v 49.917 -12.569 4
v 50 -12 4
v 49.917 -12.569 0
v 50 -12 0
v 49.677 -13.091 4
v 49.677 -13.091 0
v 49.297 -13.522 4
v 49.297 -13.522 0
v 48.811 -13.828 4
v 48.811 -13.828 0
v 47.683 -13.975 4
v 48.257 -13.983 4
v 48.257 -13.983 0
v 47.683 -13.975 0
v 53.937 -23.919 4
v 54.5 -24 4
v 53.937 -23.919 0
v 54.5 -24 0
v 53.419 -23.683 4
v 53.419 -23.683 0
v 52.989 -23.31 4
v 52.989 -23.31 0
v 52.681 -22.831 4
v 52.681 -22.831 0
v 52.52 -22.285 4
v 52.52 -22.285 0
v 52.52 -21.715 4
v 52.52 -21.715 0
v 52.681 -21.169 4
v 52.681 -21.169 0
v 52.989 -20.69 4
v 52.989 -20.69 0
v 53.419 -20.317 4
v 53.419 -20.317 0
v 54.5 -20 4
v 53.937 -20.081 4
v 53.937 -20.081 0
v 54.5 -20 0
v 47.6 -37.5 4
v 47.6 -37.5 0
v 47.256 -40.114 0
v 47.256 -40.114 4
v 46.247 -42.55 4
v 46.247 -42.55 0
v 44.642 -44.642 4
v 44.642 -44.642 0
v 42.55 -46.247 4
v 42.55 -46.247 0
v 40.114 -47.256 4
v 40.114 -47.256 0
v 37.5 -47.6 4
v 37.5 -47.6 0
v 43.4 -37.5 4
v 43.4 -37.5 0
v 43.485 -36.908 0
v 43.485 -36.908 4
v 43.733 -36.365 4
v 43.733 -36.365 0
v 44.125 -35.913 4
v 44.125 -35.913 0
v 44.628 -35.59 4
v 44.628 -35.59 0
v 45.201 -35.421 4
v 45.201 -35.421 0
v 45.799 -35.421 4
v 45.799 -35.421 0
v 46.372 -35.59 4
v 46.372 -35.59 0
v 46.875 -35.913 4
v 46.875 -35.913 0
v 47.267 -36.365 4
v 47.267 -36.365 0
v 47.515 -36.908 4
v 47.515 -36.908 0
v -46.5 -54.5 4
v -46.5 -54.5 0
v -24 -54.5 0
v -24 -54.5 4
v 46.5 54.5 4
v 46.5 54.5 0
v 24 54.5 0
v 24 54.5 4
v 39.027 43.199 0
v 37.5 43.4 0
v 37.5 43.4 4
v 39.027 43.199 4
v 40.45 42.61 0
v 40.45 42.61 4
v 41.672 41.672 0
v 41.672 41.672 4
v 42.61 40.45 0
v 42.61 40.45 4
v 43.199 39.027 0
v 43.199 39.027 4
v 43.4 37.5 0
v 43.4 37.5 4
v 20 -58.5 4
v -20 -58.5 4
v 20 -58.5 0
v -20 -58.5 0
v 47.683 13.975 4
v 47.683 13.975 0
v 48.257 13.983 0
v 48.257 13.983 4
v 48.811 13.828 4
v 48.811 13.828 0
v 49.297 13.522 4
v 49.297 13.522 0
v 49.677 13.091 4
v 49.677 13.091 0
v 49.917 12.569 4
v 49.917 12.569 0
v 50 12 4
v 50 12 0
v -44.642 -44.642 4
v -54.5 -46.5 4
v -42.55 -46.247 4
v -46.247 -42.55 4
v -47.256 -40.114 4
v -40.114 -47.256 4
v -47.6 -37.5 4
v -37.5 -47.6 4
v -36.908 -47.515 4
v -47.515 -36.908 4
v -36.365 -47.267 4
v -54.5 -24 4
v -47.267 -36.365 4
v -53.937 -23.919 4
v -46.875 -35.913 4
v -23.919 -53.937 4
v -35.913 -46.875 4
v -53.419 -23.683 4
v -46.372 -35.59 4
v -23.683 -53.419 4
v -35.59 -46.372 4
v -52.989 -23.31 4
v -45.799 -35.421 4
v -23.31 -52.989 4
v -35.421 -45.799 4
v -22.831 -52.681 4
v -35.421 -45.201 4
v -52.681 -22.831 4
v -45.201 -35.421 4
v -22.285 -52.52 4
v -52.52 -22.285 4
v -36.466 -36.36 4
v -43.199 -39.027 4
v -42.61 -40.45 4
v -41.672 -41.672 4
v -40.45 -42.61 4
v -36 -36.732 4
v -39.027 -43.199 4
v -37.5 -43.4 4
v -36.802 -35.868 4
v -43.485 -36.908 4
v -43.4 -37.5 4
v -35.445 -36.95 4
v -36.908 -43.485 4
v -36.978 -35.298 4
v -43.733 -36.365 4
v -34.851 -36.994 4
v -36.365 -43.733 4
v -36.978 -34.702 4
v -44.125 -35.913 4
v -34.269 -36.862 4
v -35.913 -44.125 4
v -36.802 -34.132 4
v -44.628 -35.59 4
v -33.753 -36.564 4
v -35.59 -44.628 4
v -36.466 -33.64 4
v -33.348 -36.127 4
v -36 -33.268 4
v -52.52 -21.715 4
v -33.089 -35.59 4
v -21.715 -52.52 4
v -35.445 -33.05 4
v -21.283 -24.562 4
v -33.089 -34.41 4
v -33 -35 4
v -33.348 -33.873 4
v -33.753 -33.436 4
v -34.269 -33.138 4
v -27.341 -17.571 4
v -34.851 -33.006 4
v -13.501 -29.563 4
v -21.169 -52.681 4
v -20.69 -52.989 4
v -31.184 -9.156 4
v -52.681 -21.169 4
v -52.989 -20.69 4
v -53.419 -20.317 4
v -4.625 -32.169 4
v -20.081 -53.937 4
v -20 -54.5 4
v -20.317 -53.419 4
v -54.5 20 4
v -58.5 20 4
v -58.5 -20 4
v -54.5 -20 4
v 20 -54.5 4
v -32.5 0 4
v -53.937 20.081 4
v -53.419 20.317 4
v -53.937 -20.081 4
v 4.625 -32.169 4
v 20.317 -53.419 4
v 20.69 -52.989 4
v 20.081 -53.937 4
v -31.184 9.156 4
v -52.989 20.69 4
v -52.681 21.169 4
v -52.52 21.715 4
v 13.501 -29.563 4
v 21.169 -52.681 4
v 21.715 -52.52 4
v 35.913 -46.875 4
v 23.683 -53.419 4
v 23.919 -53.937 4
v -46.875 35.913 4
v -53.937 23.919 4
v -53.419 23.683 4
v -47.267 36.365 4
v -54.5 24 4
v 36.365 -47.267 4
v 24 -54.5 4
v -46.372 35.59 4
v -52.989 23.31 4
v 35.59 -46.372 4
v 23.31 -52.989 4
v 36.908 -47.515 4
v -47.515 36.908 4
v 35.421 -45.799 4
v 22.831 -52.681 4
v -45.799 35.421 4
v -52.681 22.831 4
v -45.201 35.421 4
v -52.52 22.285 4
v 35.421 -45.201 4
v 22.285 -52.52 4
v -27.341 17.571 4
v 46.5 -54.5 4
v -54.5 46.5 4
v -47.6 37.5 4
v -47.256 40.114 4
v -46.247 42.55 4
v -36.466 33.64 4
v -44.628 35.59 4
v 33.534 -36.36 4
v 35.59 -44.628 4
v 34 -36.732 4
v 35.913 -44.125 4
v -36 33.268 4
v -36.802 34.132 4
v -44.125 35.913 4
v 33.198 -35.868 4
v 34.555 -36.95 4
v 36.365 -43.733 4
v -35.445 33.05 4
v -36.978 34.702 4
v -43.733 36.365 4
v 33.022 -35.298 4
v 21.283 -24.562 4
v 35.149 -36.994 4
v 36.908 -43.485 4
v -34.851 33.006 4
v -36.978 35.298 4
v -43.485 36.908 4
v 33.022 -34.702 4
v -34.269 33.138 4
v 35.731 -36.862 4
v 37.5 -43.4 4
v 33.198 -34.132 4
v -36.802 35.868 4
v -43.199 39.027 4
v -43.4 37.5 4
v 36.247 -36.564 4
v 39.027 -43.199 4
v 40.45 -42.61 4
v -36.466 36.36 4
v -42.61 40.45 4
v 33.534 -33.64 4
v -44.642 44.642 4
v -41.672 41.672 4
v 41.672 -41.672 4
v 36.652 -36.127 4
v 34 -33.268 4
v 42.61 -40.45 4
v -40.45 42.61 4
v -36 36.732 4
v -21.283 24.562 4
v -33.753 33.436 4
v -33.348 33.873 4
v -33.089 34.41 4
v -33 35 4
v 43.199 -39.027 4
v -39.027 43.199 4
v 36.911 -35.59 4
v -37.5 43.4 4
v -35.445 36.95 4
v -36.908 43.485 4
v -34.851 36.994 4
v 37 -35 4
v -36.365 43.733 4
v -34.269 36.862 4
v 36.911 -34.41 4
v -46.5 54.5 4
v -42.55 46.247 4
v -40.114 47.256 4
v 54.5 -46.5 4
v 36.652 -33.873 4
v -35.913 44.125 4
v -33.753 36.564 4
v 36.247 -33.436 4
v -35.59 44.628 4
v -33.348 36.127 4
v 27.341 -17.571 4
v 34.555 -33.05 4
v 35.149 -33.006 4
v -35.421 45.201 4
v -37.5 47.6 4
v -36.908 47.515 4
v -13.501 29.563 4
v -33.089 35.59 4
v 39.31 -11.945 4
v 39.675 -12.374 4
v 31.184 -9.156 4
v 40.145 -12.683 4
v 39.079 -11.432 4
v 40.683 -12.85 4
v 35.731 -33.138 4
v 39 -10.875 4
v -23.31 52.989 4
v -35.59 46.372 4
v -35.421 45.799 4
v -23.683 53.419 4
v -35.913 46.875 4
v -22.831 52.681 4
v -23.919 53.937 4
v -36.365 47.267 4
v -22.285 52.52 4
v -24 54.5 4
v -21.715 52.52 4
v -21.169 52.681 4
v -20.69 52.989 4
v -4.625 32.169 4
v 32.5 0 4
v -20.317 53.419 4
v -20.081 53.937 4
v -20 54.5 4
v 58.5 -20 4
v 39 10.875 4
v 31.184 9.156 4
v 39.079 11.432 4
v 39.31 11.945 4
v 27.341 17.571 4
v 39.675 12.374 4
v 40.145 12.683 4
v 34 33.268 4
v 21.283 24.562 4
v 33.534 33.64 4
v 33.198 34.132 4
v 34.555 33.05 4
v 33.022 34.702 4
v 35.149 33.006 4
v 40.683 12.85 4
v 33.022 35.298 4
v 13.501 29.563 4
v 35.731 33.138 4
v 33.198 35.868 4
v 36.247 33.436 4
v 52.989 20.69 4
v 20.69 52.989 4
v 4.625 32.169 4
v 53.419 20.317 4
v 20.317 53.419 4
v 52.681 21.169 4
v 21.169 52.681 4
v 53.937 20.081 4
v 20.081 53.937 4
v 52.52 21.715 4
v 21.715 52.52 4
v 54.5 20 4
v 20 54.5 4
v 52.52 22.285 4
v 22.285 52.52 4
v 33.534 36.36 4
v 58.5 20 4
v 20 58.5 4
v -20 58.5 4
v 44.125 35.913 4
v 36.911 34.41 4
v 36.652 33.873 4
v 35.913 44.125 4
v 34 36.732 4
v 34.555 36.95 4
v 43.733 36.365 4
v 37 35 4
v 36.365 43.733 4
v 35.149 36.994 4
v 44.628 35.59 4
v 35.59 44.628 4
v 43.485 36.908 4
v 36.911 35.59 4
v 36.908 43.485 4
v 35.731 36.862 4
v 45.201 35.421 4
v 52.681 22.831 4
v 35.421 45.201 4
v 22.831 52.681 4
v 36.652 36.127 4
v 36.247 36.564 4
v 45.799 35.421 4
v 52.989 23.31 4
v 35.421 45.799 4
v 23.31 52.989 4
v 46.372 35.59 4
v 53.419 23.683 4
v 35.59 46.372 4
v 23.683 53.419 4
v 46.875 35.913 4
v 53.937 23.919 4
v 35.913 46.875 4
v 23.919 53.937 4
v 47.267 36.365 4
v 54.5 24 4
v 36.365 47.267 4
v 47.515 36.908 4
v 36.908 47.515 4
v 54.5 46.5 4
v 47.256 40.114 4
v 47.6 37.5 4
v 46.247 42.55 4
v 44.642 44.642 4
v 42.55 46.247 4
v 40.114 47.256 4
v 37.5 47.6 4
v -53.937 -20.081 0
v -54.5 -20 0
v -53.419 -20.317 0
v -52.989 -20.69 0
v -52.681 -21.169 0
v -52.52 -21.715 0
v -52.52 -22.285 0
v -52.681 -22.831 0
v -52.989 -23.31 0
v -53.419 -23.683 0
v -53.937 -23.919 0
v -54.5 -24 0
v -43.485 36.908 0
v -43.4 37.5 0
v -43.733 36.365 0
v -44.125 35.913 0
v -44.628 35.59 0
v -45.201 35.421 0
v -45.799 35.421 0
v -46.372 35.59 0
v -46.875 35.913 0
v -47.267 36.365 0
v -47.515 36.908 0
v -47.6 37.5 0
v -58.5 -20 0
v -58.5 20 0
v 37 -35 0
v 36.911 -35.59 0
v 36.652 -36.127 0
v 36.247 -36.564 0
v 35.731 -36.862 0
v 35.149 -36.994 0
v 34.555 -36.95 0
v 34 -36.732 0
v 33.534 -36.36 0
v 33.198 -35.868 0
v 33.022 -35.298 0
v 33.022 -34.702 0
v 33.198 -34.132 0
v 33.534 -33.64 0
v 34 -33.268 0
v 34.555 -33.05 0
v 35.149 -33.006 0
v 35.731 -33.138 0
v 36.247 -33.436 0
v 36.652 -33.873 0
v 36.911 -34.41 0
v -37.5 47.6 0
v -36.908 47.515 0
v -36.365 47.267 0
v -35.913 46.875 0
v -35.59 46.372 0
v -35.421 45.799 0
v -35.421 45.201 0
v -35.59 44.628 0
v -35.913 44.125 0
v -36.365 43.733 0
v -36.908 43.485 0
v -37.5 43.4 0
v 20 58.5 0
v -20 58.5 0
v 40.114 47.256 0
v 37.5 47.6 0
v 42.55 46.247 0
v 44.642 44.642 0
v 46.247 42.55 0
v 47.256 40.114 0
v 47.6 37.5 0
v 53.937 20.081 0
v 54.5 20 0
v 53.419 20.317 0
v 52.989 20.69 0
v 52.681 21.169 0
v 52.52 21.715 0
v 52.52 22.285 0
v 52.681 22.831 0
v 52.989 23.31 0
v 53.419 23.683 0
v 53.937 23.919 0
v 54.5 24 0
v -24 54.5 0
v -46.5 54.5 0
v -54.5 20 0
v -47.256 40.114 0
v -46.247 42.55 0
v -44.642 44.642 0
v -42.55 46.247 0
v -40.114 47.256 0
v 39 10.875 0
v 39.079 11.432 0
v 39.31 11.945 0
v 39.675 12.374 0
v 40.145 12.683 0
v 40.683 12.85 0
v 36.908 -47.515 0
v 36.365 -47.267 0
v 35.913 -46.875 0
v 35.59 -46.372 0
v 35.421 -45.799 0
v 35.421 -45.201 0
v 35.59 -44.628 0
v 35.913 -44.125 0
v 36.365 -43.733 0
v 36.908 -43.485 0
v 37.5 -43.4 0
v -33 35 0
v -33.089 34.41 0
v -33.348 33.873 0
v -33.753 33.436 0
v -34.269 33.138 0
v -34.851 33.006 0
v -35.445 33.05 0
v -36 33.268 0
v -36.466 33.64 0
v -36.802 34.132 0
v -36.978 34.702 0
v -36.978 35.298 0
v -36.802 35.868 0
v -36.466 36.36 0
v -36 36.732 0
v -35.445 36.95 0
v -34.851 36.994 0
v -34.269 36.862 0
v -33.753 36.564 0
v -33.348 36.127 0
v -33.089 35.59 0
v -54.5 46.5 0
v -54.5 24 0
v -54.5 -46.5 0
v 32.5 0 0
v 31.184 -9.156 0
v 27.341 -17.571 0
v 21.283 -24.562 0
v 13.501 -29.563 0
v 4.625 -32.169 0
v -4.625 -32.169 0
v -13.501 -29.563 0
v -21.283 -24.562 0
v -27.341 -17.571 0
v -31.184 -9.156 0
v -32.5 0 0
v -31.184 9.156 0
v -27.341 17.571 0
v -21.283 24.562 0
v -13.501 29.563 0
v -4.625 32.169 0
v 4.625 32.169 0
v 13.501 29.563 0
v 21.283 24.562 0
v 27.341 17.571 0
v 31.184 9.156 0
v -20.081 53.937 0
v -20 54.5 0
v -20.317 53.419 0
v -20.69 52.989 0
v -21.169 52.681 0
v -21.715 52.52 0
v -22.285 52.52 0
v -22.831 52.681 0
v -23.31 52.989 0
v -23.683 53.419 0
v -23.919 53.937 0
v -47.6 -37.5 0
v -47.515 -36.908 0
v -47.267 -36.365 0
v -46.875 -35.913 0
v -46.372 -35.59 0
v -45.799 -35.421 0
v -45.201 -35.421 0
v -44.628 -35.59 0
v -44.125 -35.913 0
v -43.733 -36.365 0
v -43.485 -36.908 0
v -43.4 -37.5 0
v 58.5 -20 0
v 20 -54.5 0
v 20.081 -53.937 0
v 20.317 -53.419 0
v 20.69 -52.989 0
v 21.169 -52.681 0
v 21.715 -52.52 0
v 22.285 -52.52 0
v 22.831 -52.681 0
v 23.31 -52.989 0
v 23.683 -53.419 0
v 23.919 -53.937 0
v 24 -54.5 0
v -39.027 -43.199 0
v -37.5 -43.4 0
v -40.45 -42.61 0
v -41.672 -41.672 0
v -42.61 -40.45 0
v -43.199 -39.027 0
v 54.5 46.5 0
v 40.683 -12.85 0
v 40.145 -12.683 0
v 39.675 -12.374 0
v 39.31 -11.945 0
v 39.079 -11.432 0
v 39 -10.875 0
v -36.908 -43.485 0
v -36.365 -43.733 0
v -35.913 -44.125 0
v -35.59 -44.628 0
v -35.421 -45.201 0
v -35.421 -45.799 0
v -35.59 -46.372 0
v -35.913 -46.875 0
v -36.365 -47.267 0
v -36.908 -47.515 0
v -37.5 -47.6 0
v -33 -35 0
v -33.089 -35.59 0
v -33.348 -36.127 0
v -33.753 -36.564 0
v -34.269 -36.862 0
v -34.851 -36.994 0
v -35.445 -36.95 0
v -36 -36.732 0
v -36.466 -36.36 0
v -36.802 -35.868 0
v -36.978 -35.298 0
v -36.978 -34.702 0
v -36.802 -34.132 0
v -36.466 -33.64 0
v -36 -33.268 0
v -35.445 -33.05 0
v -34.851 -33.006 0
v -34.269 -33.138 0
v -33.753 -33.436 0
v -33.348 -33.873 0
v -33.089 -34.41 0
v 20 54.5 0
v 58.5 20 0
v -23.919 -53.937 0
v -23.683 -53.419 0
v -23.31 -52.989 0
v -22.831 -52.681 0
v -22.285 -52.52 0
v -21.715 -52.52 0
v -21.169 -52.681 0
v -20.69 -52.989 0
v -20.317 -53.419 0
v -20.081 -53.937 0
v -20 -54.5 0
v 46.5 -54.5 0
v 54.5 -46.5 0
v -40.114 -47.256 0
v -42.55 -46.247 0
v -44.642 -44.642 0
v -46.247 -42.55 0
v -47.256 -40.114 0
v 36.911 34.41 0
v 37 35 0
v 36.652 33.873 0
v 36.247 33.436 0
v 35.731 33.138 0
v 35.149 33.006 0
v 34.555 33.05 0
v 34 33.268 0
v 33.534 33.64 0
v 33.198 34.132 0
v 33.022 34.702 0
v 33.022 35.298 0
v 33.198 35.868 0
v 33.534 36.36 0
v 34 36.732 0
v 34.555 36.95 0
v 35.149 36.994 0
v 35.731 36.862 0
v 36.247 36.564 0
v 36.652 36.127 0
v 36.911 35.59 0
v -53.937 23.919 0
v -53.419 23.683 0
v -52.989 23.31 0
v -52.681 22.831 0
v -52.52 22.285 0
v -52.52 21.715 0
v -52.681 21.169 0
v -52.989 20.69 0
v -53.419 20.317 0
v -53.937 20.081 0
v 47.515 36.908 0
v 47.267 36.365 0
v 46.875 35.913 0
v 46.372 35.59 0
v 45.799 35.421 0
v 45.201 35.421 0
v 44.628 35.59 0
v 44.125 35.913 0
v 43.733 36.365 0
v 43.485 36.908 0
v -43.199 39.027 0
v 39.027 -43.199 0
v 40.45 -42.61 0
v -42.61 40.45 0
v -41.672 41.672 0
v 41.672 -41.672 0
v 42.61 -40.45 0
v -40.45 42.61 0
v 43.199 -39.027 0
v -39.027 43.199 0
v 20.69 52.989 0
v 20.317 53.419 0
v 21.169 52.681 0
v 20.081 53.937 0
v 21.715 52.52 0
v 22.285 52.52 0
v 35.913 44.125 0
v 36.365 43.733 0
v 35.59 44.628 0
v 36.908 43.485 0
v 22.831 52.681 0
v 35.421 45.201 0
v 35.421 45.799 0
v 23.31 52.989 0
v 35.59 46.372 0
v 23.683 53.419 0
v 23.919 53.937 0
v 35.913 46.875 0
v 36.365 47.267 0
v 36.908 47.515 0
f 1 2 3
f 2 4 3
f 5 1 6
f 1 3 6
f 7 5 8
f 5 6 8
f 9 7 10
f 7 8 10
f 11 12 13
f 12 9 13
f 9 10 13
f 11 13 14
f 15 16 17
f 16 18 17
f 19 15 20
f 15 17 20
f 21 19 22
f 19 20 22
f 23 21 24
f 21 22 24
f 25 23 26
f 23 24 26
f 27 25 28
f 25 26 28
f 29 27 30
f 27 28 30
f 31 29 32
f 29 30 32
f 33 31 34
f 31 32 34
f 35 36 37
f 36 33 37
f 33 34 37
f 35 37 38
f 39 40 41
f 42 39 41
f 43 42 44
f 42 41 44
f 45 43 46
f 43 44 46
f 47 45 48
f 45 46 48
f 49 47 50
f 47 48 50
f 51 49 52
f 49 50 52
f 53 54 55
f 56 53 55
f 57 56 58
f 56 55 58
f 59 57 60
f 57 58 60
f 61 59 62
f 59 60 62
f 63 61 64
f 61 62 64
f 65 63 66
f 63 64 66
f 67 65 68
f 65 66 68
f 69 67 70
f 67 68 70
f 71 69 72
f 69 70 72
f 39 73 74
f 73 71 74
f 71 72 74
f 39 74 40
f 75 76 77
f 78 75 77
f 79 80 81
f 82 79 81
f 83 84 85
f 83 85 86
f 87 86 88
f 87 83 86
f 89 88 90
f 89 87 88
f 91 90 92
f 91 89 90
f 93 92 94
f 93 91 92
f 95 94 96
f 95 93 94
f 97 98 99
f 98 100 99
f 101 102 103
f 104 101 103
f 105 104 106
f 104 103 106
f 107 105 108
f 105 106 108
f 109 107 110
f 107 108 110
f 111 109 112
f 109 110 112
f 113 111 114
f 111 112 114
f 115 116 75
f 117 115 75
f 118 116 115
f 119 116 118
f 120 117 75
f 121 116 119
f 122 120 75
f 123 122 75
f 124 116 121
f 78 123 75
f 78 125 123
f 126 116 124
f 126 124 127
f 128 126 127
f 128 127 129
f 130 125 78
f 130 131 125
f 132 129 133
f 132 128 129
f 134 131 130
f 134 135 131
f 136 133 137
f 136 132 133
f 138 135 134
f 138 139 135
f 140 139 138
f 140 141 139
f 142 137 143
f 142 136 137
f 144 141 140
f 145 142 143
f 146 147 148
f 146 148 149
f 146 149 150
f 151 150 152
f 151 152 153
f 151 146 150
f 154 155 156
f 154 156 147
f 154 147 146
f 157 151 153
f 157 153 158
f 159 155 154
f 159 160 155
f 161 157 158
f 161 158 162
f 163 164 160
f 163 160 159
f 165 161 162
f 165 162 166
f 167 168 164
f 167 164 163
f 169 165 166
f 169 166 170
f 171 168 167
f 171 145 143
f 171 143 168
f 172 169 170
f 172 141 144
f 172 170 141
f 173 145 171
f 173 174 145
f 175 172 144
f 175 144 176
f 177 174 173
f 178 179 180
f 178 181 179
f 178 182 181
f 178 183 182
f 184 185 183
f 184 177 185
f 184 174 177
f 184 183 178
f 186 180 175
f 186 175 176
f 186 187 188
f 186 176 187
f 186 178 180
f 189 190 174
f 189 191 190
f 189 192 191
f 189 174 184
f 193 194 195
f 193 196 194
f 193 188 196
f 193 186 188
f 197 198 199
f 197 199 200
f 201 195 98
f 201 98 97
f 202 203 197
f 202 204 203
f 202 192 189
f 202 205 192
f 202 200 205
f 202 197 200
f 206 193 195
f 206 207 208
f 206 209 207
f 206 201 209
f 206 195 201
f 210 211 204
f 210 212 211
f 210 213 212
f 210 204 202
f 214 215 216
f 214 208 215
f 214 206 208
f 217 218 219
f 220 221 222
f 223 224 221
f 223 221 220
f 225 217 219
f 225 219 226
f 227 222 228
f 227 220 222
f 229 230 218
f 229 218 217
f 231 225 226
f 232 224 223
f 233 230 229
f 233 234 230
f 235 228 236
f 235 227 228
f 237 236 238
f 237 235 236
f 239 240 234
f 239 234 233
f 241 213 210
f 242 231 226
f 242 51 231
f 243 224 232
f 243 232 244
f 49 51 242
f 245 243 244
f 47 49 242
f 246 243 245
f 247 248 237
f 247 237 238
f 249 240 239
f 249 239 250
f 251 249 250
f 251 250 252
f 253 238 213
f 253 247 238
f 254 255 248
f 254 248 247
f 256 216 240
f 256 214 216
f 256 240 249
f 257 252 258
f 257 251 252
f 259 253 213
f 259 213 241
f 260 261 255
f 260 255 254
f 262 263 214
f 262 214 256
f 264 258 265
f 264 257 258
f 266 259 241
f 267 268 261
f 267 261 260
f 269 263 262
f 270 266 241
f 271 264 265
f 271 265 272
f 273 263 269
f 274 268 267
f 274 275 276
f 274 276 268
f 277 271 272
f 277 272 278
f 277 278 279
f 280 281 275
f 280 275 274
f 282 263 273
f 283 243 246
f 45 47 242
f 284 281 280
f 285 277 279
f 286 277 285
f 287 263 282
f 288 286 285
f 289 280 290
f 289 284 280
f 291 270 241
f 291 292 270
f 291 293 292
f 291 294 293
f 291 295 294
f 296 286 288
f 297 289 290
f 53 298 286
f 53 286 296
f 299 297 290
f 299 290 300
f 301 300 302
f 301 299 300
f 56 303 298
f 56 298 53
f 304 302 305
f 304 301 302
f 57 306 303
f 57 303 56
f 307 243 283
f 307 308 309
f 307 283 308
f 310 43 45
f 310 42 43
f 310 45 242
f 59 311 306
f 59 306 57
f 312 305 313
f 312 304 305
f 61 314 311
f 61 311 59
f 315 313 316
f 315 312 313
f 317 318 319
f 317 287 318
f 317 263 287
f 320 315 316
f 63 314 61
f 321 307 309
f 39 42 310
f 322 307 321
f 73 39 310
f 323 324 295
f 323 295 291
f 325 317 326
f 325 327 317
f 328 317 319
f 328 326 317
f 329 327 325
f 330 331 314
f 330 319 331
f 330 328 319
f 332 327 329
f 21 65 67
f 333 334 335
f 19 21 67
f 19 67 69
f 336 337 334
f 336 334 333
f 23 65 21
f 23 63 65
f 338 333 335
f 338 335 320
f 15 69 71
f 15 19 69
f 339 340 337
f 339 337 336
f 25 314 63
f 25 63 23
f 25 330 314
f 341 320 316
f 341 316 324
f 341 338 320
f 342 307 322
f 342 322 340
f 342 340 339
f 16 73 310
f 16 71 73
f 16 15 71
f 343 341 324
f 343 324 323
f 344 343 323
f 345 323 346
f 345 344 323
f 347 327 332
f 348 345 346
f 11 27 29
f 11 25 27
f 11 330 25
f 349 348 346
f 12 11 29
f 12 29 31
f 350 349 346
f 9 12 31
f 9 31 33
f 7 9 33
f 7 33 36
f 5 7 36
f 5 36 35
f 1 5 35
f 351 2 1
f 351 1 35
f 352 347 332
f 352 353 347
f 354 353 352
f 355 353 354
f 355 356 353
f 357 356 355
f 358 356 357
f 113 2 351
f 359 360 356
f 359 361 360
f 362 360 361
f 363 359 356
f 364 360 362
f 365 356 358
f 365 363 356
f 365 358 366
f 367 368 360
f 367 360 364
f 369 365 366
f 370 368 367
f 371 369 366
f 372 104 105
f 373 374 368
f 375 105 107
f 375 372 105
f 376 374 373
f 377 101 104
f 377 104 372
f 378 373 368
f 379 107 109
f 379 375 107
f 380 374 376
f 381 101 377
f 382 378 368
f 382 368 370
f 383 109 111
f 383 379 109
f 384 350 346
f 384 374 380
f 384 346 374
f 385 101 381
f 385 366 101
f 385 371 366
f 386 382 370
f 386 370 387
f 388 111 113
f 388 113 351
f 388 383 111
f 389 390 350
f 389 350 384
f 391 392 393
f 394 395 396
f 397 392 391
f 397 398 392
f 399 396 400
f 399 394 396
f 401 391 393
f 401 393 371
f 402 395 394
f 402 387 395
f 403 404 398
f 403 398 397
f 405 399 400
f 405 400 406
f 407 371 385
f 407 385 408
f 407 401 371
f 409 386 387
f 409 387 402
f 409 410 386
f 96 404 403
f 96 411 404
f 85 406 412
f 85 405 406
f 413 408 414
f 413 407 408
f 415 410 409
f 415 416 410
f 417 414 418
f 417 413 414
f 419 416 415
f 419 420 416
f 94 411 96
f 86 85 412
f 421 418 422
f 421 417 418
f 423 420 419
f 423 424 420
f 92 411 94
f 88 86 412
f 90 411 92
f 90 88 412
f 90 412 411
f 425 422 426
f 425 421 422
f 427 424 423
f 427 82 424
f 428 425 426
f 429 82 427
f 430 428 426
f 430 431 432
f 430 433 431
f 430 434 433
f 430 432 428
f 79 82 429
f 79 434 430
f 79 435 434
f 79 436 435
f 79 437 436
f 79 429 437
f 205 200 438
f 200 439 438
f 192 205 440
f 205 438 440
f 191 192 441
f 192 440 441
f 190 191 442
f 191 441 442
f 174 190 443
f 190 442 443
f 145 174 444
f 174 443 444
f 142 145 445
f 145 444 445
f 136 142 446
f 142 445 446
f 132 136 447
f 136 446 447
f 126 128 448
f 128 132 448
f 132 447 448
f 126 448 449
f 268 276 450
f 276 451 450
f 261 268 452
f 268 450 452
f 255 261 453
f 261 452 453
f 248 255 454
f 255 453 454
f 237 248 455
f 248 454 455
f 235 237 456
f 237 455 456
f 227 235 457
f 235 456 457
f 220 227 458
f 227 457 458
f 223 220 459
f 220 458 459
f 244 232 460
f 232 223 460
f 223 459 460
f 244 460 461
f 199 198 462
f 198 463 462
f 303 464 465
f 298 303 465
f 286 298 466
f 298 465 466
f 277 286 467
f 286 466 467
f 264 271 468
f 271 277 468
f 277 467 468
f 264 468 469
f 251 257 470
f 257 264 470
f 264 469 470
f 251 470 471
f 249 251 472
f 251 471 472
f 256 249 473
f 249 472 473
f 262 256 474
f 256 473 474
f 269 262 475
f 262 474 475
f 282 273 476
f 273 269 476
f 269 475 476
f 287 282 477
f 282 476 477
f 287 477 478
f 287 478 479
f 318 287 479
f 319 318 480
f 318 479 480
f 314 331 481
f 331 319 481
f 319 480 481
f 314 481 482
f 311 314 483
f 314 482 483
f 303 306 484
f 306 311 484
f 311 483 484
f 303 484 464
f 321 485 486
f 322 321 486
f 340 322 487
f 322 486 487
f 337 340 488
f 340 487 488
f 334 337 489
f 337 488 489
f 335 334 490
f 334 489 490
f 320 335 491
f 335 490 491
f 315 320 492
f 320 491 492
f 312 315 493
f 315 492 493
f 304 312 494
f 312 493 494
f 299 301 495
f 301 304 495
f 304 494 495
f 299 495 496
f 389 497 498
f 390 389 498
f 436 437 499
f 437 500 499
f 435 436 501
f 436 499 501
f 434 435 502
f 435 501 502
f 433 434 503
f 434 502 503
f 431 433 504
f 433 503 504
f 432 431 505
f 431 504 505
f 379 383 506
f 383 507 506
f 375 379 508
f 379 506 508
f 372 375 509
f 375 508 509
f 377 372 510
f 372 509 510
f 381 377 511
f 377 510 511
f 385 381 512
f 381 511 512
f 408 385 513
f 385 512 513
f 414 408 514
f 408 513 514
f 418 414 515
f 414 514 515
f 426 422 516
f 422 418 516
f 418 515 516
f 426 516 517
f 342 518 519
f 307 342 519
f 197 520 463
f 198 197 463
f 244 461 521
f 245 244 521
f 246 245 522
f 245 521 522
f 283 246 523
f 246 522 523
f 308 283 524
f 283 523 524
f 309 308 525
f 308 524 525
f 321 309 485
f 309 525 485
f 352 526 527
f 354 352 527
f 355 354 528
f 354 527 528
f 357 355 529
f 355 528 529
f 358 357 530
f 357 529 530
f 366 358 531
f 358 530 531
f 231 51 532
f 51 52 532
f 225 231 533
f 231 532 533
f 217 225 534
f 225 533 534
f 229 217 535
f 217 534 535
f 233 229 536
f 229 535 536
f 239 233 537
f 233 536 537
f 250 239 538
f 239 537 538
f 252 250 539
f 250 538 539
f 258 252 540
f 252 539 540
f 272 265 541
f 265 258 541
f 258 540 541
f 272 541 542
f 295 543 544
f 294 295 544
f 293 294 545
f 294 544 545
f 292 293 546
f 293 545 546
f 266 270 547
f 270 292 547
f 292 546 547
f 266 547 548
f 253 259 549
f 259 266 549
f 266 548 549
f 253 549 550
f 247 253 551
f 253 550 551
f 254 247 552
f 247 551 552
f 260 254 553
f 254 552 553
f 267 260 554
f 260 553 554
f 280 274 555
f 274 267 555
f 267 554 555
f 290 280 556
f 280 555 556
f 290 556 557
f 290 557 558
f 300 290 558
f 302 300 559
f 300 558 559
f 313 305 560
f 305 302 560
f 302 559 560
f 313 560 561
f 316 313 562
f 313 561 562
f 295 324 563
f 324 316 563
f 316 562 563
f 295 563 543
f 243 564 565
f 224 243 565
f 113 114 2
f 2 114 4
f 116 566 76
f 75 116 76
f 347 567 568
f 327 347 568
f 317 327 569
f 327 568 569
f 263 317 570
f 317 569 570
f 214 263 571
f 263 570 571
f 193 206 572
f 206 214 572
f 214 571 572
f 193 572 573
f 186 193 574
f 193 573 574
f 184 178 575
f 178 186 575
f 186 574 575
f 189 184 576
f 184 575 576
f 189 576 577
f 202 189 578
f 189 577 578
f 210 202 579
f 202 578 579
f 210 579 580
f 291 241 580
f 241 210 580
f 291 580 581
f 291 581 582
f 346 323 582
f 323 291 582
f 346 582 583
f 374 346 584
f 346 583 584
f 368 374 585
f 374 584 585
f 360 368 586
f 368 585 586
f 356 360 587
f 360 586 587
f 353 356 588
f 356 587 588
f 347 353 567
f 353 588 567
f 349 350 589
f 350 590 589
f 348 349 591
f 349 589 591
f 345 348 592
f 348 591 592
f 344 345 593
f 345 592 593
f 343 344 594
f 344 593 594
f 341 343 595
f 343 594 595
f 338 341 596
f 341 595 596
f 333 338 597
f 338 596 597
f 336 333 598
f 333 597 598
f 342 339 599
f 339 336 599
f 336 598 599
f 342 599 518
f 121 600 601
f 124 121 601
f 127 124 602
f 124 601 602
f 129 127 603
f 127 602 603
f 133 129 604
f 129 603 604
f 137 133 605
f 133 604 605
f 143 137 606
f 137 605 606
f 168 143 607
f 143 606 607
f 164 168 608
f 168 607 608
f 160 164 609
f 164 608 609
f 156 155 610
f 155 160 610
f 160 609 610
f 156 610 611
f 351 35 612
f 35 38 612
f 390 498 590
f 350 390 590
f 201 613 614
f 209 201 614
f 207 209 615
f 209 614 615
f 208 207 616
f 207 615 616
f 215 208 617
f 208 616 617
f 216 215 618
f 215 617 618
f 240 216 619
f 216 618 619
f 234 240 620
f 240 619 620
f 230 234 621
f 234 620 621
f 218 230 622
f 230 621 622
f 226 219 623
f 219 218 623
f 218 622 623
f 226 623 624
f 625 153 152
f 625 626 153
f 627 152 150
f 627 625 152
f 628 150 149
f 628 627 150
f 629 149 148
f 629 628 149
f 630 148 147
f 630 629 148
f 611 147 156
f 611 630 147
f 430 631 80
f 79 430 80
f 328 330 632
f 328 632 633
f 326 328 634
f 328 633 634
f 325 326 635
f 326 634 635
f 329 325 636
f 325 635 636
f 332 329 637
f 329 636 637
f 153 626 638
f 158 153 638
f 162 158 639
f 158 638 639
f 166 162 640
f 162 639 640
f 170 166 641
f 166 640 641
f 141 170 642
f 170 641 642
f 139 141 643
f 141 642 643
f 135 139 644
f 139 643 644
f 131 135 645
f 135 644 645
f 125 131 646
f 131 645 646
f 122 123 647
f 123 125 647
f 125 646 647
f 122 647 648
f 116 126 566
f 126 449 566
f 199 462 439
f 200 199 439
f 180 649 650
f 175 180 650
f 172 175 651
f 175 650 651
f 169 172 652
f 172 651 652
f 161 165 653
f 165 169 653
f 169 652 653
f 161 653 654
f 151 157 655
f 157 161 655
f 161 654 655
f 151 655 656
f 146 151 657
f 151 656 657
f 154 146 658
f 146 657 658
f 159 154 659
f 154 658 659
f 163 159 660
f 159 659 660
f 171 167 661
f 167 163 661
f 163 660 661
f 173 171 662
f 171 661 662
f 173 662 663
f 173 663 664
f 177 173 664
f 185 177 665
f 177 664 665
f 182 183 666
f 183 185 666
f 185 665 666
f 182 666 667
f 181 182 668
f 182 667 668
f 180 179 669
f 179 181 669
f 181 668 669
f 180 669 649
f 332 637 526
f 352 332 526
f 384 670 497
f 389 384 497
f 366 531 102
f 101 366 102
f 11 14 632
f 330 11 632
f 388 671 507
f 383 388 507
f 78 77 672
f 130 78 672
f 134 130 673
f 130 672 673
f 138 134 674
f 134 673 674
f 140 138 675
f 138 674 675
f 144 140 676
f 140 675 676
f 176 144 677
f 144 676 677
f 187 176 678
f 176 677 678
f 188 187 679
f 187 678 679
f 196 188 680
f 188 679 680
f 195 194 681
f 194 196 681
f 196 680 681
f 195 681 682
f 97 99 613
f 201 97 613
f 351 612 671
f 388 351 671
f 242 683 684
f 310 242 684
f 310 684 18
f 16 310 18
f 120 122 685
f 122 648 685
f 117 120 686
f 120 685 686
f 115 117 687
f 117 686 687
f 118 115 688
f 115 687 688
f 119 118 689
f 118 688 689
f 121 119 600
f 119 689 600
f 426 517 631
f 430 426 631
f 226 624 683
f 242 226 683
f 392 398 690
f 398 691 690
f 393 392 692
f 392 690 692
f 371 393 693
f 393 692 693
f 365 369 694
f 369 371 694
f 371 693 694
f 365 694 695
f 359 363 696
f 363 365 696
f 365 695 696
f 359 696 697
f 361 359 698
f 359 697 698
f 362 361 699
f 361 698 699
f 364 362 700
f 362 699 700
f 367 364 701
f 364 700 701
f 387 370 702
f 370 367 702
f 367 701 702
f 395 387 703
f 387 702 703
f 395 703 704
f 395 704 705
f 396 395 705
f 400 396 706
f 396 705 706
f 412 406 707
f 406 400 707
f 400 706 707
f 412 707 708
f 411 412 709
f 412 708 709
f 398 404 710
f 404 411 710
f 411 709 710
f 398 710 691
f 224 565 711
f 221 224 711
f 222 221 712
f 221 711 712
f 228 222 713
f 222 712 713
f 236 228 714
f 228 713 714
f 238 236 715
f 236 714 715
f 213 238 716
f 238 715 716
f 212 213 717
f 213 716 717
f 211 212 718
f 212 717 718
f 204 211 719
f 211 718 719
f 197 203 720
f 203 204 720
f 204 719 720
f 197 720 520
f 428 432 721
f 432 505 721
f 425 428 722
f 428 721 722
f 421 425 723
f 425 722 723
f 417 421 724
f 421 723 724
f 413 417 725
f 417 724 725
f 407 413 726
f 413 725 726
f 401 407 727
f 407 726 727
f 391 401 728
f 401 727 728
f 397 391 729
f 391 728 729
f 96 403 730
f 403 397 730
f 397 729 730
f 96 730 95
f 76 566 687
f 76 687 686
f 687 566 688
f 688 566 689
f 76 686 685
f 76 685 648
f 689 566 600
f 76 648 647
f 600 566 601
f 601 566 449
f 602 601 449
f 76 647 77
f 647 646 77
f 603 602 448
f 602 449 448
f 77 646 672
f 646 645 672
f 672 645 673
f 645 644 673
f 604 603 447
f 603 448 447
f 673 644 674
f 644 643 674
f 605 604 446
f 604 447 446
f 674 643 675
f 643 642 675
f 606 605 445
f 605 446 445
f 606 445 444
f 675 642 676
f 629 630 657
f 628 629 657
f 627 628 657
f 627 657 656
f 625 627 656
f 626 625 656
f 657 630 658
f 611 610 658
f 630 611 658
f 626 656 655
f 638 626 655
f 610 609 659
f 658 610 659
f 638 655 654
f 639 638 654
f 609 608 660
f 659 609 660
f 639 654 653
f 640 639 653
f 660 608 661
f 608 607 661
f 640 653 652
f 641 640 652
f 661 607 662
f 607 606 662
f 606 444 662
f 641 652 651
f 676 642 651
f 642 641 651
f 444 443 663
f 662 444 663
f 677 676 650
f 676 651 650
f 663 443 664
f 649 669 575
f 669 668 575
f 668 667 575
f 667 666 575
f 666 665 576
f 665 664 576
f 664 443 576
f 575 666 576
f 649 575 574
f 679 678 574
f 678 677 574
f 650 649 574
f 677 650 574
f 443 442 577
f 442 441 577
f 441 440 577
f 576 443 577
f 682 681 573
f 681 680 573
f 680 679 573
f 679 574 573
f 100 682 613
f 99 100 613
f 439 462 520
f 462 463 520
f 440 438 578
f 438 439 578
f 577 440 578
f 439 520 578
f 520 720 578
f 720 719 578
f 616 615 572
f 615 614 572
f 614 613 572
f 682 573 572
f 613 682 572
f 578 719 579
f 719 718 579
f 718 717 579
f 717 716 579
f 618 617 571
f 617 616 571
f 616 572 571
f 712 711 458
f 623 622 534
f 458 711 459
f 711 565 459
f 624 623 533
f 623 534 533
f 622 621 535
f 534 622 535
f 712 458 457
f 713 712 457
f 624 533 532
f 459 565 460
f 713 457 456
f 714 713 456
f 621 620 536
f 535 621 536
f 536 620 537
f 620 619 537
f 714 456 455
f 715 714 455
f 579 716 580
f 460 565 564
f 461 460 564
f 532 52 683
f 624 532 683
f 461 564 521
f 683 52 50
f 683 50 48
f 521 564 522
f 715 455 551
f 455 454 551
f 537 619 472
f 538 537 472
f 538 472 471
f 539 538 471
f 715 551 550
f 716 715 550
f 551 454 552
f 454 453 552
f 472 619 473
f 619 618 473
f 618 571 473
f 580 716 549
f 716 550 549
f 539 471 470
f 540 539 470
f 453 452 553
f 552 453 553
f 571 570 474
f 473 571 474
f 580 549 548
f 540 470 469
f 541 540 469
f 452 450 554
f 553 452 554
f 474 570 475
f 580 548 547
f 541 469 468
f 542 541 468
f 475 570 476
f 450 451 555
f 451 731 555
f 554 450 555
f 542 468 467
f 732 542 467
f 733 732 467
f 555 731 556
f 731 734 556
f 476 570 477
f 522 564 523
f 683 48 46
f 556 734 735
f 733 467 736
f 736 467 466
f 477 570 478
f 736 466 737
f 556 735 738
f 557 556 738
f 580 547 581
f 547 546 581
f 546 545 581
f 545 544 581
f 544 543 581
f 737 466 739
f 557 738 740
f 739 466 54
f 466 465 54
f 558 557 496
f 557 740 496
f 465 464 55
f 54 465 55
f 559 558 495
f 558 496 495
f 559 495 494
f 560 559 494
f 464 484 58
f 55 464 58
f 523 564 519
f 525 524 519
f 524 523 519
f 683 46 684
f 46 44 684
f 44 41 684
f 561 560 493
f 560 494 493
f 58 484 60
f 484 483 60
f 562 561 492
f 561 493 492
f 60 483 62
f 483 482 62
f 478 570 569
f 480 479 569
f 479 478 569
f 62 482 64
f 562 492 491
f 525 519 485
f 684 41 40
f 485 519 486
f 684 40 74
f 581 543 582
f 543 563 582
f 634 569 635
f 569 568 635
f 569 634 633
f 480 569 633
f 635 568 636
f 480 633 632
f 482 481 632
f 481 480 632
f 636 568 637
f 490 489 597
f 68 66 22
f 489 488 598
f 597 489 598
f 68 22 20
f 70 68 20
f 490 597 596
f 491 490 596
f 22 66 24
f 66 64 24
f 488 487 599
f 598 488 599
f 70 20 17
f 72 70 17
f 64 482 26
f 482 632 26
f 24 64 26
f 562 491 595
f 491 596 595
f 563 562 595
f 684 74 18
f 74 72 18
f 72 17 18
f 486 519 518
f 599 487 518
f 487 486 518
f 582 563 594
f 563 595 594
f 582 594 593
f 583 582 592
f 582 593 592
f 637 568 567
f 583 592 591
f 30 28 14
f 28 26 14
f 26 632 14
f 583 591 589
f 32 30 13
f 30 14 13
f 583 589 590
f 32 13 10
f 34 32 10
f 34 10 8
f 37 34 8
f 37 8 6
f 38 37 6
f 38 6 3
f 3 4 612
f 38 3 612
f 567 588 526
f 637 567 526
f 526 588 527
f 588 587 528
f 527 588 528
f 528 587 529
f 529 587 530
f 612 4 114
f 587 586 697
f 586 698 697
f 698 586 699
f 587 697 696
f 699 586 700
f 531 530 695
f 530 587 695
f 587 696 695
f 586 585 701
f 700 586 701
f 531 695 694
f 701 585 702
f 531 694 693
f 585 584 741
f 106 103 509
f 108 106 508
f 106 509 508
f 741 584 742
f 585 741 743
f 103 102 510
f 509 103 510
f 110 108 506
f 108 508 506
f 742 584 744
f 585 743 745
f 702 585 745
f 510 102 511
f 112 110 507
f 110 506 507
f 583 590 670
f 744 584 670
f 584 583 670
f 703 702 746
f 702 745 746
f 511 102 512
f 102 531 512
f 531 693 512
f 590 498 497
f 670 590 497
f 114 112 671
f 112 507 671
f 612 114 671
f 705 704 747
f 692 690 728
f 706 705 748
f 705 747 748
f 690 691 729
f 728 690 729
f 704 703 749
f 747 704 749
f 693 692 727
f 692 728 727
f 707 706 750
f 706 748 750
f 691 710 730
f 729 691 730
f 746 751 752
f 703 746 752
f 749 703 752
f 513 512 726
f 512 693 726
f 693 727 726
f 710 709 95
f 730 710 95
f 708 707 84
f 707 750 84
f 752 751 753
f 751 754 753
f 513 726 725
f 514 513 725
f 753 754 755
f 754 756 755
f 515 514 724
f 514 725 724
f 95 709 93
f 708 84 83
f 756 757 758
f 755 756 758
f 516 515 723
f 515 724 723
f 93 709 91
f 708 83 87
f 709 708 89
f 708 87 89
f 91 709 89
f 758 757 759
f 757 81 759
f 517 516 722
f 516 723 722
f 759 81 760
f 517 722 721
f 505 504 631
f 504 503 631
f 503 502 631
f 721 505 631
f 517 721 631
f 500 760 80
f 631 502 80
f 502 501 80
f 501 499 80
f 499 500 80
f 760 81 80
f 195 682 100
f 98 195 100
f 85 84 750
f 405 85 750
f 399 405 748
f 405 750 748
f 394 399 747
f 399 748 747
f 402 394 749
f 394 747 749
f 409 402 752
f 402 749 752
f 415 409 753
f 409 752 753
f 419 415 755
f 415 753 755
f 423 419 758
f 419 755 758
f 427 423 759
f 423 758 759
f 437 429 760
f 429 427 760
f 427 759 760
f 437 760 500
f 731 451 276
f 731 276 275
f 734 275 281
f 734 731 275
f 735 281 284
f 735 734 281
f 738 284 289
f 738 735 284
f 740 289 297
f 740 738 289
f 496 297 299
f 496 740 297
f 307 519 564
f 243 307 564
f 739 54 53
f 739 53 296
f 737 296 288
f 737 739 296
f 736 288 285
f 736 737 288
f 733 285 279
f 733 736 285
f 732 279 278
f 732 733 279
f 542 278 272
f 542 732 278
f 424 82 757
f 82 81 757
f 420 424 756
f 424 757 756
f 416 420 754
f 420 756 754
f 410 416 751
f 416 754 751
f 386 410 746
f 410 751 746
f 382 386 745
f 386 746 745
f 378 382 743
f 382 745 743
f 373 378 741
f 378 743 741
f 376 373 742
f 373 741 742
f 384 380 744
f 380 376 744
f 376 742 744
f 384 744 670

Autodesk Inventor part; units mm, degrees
ref_plane "YZ Plane" through (0, 0, 0) normal (1, 0, 0) x (0, 1, 0)
ref_plane "XZ Plane" through (0, 0, 0) normal (0, 1, 0) x (-1, 0, 0)
ref_plane "XY Plane" through (0, 0, 0) normal (0, 0, 1) x (1, 0, 0)
sketch "Boceto1" plane through (0, 0, 0) normal (0, 0, 1) x (1, 0, 0)
  line L0 (35, 35) -> (-35, 35) construction
  line L1 (-35, 35) -> (-35, -35) construction
  line L2 (-35, -35) -> (35, -35) construction
  line L3 (35, -35) -> (35, 35) construction
  circle A0 centre (35, 35) radius 2
  circle A1 centre (35, -35) radius 2
  circle A2 centre (-35, -35) radius 2
  circle A3 centre (-35, 35) radius 2
  circle A4 centre (0, 0) radius 32.5
  line L4 (50, 12) -> (50, -12)
  arc A5 (47.6827, -13.9747) -> (50, -12) centre (48, -12) ccw
  line L5 (47.6827, -13.9747) -> (40.6827, -12.85)
  arc A6 (39, -10.8753) -> (40.6827, -12.85) centre (41, -10.8753) ccw
  line L6 (39, -10.8753) -> (39, 10.8753)
  arc A7 (40.6827, 12.85) -> (39, 10.8753) centre (41, 10.8753) ccw
  line L7 (40.6827, 12.85) -> (47.6827, 13.9747)
  arc A8 (50, 12) -> (47.6827, 13.9747) centre (48, 12) ccw
  line L8 (0, 7) -> (32, 7) construction
  line L9 (32, 7) -> (32, 31) construction
  line L10 (32, 31) -> (0, 31) construction
  line L11 (0, 31) -> (0, 7) construction
  line L12 (29.5, -31) -> (29.5, -12) construction
  line L13 (29.5, -12) -> (2.5, -12) construction
  line L14 (2.5, -12) -> (2.5, -31) construction
  line L15 (2.5, -31) -> (29.5, -31) construction
  arc A9 (-37.5, -47.6) -> (-37.5, -43.4) centre (-37.5, -45.5) ccw projected
  arc A10 (-43.4, -37.5) -> (-37.5, -43.4) centre (-37.5, -37.5) ccw projected
  arc A11 (-43.4, -37.5) -> (-47.6, -37.5) centre (-45.5, -37.5) ccw projected
  arc A12 (-47.6, -37.5) -> (-37.5, -47.6) centre (-37.5, -37.5) ccw projected
  arc A13 (-47.6, 37.5) -> (-43.4, 37.5) centre (-45.5, 37.5) ccw projected
  arc A14 (-37.5, 43.4) -> (-43.4, 37.5) centre (-37.5, 37.5) ccw projected
  arc A15 (-37.5, 43.4) -> (-37.5, 47.6) centre (-37.5, 45.5) ccw projected
  arc A16 (-37.5, 47.6) -> (-47.6, 37.5) centre (-37.5, 37.5) ccw projected
  arc A17 (37.5, 47.6) -> (37.5, 43.4) centre (37.5, 45.5) ccw projected
  arc A18 (43.4, 37.5) -> (37.5, 43.4) centre (37.5, 37.5) ccw projected
  arc A19 (43.4, 37.5) -> (47.6, 37.5) centre (45.5, 37.5) ccw projected
  arc A20 (47.6, 37.5) -> (37.5, 47.6) centre (37.5, 37.5) ccw projected
  arc A21 (37.5, -43.4) -> (37.5, -47.6) centre (37.5, -45.5) ccw projected
  arc A22 (37.5, -47.6) -> (47.6, -37.5) centre (37.5, -37.5) ccw projected
  arc A23 (47.6, -37.5) -> (43.4, -37.5) centre (45.5, -37.5) ccw projected
  arc A24 (37.5, -43.4) -> (43.4, -37.5) centre (37.5, -37.5) ccw projected
  line L16 (-58.5, 20) -> (-58.5, -20) projected
  line L17 (-54.5, 20) -> (-58.5, 20) projected
  arc A25 (-54.5, 20) -> (-54.5, 24) centre (-54.5, 22) ccw projected
  line L18 (-54.5, 46.5) -> (-54.5, 24) projected
  line L19 (-46.5, 54.5) -> (-54.5, 46.5) projected
  line L20 (-24, 54.5) -> (-46.5, 54.5) projected
  arc A26 (-24, 54.5) -> (-20, 54.5) centre (-22, 54.5) ccw projected
  line L21 (-20, 58.5) -> (-20, 54.5) projected
  line L22 (20, 58.5) -> (-20, 58.5) projected
  line L23 (20, 54.5) -> (20, 58.5) projected
  arc A27 (20, 54.5) -> (24, 54.5) centre (22, 54.5) ccw projected
  line L24 (46.5, 54.5) -> (24, 54.5) projected
  line L25 (54.5, 46.5) -> (46.5, 54.5) projected
  line L26 (54.5, 24) -> (54.5, 46.5) projected
  arc A28 (54.5, 24) -> (54.5, 20) centre (54.5, 22) ccw projected
  line L27 (58.5, 20) -> (54.5, 20) projected
  line L28 (58.5, -20) -> (58.5, 20) projected
  line L29 (54.5, -20) -> (58.5, -20) projected
  arc A29 (54.5, -20) -> (54.5, -24) centre (54.5, -22) ccw projected
  line L30 (54.5, -46.5) -> (54.5, -24) projected
  line L31 (46.5, -54.5) -> (54.5, -46.5) projected
  line L32 (24, -54.5) -> (46.5, -54.5) projected
  arc A30 (24, -54.5) -> (20, -54.5) centre (22, -54.5) ccw projected
  line L33 (20, -58.5) -> (20, -54.5) projected
  line L34 (-20, -58.5) -> (20, -58.5) projected
  line L35 (-20, -54.5) -> (-20, -58.5) projected
  arc A31 (-20, -54.5) -> (-24, -54.5) centre (-22, -54.5) ccw projected
  line L36 (-46.5, -54.5) -> (-24, -54.5) projected
  line L37 (-54.5, -46.5) -> (-46.5, -54.5) projected
  line L38 (-54.5, -24) -> (-54.5, -46.5) projected
  arc A32 (-54.5, -24) -> (-54.5, -20) centre (-54.5, -22) ccw projected
  line L39 (-58.5, -20) -> (-54.5, -20) projected
  point P0 (35, 0)
  point P1 (58.5, 0)
  point P2 (0, 35)
  point P3 (39, 0)
  point P4 (50, 0)
  dimension "d0" = 70
  dimension "d1" = 4
  dimension "d2" = 65
  dimension "d3" = 2
  dimension "d4" = 11
  dimension "d5" = 28
  dimension "d6" = 25.7
  dimension "d8" = 4
extrude "Extrusión1" add sketch "Boceto1" along normal blind 4
properties part number "tapa ventilador"
